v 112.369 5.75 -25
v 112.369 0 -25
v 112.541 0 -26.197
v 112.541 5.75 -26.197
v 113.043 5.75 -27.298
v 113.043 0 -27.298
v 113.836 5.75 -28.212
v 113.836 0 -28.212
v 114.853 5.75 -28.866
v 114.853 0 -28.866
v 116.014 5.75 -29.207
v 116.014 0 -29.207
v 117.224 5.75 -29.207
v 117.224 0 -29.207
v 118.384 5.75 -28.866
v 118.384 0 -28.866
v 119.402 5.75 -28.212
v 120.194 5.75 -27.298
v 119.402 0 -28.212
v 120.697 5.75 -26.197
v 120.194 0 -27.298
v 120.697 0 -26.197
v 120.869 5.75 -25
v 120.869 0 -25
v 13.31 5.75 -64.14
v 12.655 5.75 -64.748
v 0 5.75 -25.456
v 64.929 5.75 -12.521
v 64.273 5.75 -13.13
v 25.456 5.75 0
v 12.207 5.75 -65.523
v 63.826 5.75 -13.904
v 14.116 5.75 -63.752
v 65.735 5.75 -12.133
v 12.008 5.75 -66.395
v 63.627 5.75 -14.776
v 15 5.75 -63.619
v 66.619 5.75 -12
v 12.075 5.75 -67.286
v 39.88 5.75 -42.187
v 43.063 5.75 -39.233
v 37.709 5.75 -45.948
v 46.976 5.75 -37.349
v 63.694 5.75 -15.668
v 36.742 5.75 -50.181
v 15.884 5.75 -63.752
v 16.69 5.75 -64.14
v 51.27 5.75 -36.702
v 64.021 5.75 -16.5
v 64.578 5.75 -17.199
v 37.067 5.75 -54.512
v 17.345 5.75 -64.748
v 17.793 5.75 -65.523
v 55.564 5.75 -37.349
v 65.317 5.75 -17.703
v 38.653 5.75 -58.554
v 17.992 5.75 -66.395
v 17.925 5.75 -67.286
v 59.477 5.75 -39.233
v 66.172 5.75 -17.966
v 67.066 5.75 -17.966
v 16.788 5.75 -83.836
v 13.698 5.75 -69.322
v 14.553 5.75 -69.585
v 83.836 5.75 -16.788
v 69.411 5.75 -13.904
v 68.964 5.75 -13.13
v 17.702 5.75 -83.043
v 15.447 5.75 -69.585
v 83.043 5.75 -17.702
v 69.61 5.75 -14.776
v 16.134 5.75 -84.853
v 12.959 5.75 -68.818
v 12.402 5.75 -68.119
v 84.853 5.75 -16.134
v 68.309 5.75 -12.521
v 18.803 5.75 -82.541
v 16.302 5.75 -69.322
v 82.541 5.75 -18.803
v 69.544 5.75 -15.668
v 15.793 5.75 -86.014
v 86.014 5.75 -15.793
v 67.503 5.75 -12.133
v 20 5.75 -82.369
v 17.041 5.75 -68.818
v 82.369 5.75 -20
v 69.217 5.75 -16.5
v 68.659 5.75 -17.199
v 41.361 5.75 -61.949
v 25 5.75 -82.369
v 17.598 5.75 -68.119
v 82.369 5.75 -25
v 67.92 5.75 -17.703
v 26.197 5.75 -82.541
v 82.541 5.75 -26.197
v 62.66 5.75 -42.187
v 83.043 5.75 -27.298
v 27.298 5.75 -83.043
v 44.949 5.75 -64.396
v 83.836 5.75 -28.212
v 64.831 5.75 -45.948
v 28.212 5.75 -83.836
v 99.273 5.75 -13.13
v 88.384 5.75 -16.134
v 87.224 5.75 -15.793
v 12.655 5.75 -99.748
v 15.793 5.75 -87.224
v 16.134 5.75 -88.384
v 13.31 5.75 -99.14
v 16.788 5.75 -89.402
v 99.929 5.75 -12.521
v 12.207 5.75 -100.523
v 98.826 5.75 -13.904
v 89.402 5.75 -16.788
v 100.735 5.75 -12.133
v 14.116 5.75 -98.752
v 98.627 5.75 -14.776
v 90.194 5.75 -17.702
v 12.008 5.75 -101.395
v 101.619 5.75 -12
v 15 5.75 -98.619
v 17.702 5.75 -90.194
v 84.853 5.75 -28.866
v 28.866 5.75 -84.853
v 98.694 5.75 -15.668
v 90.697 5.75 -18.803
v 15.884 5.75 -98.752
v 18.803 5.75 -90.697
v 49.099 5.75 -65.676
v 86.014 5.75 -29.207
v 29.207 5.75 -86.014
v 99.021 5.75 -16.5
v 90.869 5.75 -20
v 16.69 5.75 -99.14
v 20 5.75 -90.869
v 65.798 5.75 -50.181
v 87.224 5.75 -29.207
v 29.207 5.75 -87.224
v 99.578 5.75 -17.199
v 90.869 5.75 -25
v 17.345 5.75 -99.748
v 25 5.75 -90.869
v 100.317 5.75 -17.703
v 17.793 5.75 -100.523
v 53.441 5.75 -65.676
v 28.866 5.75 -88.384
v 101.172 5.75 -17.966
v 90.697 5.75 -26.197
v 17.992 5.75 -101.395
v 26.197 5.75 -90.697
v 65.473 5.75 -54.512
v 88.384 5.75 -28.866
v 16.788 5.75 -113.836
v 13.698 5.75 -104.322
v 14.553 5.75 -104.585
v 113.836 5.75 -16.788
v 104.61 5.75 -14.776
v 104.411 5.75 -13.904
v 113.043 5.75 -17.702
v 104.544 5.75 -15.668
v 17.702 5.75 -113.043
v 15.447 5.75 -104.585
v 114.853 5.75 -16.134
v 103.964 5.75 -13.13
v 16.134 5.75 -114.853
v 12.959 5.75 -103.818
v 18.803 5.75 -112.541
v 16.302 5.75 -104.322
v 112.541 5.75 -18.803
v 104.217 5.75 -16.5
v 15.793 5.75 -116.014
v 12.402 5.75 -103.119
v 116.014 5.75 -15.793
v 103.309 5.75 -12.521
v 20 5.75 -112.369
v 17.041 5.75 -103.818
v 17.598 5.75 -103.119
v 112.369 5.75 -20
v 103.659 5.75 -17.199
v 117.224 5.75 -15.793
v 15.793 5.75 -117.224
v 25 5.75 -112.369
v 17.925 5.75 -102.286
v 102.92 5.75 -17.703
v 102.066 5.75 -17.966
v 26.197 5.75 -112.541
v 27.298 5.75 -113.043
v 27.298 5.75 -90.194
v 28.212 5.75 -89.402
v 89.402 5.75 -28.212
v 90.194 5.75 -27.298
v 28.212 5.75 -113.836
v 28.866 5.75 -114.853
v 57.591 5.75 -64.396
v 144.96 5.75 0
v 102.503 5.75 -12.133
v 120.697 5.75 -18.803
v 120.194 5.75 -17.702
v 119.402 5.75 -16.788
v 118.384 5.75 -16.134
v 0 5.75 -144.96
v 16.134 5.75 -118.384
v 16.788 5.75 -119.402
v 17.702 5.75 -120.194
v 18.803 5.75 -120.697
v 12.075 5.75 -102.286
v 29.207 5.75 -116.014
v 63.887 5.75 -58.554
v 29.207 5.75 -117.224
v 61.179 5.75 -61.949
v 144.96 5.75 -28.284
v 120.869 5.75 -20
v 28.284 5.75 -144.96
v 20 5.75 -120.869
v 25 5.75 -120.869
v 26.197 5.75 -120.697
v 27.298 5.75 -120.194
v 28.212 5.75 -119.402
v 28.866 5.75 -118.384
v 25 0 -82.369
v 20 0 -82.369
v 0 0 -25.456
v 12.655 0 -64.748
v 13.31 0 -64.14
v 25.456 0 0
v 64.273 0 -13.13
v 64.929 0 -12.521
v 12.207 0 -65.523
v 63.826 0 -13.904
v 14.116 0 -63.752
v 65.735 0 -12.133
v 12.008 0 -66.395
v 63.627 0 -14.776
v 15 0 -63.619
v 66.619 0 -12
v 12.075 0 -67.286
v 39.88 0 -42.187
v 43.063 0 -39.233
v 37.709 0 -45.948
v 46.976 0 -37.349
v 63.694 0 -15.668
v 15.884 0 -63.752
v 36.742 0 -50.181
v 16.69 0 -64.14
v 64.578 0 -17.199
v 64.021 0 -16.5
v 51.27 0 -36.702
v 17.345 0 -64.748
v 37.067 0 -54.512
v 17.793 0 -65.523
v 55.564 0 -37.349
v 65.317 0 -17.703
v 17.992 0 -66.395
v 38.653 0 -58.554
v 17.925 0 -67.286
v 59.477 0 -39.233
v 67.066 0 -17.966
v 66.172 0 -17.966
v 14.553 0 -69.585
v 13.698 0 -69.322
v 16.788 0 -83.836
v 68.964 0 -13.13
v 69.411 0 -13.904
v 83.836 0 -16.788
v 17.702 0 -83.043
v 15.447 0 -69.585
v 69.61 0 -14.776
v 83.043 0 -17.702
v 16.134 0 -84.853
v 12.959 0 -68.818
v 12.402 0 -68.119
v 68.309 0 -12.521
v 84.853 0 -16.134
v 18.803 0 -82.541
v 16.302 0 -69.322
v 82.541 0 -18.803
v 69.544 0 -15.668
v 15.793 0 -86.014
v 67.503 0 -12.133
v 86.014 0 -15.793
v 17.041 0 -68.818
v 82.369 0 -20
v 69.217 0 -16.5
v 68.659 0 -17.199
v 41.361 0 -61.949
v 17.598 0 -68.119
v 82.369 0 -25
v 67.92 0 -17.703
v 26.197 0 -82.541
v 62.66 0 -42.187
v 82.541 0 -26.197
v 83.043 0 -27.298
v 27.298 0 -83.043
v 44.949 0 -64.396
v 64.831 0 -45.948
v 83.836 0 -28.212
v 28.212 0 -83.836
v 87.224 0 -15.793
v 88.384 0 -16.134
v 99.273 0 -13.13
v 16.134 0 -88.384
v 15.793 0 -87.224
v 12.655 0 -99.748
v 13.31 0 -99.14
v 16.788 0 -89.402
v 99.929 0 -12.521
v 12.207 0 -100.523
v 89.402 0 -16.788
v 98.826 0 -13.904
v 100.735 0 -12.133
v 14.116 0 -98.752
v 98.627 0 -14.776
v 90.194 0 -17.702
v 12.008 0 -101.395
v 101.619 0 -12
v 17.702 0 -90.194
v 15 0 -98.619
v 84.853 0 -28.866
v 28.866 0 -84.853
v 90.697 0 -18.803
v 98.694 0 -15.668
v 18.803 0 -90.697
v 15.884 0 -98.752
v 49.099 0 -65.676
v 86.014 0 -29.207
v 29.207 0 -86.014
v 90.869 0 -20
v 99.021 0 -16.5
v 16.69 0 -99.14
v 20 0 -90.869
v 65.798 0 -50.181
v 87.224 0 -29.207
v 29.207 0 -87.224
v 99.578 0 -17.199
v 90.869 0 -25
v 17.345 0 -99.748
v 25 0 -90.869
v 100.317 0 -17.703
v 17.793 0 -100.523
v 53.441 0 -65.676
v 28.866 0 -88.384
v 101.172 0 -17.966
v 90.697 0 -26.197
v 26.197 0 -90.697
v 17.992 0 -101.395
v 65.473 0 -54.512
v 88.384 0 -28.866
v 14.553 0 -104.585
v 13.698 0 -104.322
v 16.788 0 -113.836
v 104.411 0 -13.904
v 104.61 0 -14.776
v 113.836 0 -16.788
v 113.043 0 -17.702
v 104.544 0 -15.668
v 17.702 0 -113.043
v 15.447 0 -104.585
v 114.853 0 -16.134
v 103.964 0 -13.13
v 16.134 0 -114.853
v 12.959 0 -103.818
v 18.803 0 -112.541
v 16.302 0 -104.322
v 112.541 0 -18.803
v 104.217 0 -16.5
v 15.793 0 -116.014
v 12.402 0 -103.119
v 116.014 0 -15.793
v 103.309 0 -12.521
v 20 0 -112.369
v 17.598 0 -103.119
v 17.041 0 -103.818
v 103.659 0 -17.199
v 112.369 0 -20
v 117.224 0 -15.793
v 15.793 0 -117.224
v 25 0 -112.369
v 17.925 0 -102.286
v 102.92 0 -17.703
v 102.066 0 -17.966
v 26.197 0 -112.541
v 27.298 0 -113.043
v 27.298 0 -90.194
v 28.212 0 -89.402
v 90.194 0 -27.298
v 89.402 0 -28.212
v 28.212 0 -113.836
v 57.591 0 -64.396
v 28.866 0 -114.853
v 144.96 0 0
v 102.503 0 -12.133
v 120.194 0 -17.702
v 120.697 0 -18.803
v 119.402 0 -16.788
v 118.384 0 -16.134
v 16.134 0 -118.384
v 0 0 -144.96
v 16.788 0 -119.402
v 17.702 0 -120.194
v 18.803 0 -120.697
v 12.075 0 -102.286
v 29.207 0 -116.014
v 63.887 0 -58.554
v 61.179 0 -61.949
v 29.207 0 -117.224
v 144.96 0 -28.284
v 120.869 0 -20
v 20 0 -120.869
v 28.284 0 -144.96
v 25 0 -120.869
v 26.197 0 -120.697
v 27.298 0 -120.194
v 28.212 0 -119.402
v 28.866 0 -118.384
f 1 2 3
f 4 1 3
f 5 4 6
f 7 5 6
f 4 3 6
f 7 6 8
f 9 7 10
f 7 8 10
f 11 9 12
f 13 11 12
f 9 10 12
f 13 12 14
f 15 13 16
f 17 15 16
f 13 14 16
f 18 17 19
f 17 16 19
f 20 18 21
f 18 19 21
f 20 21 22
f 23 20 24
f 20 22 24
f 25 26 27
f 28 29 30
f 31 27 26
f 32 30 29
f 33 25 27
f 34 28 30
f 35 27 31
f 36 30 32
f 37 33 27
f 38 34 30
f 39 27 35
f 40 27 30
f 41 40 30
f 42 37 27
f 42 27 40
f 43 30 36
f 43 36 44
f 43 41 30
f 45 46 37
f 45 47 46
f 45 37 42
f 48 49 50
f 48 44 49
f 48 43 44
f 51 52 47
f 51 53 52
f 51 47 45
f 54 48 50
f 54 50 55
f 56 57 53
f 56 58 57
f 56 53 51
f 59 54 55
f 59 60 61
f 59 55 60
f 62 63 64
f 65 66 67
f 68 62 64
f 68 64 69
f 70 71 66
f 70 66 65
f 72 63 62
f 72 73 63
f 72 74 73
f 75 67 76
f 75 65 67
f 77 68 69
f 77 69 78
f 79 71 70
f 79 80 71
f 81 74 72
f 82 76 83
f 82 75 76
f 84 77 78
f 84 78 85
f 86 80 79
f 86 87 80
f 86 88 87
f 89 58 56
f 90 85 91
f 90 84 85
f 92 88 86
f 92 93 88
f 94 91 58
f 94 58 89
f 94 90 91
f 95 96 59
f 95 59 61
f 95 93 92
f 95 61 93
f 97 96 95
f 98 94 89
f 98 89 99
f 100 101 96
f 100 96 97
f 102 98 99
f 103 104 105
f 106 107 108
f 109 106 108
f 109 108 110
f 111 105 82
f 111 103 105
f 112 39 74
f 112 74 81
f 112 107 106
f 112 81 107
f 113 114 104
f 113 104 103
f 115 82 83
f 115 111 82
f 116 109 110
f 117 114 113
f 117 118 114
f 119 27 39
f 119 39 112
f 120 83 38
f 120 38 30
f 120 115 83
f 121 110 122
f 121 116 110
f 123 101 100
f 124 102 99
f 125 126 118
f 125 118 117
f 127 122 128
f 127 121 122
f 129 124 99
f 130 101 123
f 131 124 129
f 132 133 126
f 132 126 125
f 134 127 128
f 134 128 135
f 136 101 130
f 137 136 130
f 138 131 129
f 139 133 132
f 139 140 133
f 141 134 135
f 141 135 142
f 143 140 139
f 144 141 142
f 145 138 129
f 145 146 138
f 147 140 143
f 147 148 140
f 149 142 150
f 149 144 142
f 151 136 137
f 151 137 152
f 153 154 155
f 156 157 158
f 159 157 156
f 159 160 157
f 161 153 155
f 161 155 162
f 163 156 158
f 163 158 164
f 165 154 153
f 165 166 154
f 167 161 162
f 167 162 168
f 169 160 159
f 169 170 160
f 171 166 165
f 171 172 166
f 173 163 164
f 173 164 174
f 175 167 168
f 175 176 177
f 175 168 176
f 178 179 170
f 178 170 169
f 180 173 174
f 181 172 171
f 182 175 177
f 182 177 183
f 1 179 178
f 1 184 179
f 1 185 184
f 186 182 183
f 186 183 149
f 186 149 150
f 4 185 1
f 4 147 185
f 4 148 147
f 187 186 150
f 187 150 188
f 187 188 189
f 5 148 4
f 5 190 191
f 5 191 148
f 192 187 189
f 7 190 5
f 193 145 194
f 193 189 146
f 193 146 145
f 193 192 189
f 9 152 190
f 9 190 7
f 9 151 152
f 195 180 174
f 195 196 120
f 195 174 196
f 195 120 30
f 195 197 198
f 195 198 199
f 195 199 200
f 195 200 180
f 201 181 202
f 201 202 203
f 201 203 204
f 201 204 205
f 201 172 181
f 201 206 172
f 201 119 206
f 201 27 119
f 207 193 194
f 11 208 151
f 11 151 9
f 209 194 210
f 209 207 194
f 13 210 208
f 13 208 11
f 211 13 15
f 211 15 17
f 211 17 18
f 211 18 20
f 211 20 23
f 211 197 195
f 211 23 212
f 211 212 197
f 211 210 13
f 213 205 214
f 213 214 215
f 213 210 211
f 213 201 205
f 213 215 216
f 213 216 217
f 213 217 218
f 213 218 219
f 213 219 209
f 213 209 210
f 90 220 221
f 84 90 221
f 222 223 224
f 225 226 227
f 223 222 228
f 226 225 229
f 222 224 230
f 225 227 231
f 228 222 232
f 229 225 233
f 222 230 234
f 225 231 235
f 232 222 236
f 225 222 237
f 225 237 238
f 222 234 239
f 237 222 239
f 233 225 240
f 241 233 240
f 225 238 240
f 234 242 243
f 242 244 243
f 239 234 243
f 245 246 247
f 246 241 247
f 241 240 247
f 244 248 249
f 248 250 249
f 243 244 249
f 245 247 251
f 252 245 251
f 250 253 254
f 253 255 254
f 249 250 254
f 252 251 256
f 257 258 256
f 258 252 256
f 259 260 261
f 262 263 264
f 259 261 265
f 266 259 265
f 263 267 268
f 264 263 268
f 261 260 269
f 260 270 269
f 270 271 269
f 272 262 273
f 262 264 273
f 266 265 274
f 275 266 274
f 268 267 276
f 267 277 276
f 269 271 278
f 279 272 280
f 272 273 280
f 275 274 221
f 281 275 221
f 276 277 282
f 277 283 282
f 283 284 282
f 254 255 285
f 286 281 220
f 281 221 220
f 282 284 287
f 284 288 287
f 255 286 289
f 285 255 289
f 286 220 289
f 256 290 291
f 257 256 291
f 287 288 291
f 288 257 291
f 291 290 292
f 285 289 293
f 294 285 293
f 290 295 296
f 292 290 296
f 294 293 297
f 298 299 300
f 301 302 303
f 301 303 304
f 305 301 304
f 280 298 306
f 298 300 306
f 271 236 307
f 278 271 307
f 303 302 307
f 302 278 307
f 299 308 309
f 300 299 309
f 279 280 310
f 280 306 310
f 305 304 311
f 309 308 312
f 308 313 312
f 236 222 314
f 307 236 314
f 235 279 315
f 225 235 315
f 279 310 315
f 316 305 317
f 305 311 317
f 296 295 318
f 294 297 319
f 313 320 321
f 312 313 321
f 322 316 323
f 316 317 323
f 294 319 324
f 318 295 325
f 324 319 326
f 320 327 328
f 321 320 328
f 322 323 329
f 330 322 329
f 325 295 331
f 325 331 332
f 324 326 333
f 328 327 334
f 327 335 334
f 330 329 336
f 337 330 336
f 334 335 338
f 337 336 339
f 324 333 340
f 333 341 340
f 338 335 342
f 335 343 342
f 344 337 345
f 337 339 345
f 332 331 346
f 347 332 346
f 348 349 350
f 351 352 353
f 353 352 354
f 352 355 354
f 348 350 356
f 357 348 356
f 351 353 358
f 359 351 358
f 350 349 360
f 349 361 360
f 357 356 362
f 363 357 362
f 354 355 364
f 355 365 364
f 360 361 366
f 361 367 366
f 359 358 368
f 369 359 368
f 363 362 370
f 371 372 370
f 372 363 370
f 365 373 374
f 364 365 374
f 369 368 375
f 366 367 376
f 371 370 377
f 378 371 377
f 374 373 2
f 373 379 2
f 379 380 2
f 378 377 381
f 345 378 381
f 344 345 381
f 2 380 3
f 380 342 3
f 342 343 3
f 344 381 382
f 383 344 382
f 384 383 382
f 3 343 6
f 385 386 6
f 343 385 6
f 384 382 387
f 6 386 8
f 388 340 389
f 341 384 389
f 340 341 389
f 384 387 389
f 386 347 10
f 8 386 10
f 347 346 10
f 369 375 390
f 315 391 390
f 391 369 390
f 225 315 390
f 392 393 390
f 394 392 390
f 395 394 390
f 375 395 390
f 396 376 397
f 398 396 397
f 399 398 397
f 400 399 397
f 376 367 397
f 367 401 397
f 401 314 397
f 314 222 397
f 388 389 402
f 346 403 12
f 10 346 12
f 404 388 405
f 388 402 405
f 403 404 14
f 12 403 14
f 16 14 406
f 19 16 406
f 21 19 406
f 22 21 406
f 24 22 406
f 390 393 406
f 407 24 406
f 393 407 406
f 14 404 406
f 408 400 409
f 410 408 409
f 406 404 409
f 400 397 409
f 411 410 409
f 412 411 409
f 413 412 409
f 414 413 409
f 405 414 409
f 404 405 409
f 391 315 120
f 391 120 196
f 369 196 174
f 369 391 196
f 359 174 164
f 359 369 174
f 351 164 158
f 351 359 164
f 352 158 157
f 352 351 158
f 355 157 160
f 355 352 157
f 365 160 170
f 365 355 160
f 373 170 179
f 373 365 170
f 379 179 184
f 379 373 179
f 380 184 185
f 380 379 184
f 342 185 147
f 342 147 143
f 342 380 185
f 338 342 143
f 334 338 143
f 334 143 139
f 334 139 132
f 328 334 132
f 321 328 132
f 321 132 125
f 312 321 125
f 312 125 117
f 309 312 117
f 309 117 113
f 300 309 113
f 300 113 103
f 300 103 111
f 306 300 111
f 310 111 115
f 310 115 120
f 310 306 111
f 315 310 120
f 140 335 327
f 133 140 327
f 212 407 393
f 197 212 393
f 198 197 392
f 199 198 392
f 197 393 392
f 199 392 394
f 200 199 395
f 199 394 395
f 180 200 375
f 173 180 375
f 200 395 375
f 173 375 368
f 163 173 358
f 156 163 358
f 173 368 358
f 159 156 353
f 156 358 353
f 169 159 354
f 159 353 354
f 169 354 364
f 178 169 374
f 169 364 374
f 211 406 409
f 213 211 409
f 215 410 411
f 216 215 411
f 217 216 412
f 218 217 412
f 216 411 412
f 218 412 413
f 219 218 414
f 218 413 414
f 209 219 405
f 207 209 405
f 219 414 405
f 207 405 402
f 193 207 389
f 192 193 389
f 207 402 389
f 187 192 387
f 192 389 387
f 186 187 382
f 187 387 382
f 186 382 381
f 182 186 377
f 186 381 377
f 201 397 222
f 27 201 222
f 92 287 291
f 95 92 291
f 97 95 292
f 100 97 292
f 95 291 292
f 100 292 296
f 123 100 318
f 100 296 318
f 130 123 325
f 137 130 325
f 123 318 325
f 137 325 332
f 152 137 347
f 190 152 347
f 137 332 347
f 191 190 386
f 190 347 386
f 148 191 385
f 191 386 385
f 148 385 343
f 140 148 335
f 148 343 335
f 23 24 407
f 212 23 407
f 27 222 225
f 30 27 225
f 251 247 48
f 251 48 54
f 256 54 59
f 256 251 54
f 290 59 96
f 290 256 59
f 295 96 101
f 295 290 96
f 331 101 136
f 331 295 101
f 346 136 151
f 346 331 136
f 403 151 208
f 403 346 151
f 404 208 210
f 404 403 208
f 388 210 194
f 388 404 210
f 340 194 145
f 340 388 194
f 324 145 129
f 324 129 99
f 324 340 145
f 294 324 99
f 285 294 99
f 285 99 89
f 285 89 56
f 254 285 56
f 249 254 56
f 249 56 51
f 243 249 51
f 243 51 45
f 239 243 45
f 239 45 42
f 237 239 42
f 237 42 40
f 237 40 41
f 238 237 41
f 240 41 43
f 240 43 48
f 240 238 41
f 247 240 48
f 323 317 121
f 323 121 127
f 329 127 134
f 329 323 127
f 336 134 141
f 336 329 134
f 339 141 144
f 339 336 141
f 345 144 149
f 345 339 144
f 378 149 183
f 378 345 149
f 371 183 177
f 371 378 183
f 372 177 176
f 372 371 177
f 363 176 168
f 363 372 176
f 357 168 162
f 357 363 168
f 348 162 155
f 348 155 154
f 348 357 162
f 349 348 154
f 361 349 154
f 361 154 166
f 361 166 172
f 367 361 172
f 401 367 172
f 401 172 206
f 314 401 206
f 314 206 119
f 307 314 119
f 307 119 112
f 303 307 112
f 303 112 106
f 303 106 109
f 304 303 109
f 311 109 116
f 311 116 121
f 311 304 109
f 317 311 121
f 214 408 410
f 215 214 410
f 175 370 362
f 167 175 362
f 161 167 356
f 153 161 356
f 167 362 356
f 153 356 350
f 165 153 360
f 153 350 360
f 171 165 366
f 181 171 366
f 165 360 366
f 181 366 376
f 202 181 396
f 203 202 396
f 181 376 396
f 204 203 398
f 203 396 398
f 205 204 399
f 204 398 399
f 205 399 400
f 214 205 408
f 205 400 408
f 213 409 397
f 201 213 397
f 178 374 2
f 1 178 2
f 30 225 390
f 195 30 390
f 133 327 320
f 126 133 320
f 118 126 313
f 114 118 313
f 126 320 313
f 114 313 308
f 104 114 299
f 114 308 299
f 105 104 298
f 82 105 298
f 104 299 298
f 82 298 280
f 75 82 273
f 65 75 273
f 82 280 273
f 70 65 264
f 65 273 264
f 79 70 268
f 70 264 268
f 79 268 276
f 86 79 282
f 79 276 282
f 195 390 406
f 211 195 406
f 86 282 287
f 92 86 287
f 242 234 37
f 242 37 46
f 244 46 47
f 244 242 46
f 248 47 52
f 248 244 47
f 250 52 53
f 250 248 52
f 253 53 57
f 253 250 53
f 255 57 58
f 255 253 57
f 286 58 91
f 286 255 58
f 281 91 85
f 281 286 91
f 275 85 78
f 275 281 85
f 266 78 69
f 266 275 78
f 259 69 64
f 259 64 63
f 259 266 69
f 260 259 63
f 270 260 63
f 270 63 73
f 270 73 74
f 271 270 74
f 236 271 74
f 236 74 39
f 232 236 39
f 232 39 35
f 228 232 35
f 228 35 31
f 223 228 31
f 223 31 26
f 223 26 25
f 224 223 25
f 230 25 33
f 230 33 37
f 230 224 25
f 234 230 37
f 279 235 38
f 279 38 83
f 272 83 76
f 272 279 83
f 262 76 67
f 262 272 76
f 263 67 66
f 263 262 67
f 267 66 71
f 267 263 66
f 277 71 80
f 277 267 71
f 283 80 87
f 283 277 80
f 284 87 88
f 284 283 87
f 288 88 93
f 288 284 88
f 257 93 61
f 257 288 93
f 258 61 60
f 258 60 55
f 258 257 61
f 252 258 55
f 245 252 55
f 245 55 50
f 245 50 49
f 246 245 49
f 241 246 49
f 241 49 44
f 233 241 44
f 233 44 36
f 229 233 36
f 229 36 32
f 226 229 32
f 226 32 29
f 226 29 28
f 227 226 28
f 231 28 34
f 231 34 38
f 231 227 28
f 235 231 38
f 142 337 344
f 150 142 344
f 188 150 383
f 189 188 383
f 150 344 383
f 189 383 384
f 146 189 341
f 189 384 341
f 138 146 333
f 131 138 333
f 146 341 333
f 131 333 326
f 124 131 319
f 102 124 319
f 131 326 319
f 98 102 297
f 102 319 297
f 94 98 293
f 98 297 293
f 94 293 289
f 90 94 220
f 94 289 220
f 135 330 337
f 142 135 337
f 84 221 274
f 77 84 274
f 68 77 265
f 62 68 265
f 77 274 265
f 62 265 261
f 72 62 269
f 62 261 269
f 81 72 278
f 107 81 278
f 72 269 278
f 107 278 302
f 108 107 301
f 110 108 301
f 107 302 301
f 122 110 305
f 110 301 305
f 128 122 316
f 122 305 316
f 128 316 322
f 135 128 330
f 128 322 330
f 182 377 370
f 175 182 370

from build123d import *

# Parameters (mm, degrees)
SKETCH_1_R      = 3
SKETCH_1_R_2    = 14.568467703
EXTRUDE_1_DEPTH = 5.75


with BuildPart() as part:
    # 草图1 → 凸台-拉伸1 (new body)
    with BuildSketch(Plane(origin=(0, 0, 0), x_dir=(1, 0, 0), z_dir=(0, 1, 0))):
        Polygon((0, 144.96), (0, 25.455844123), (25.455844123, 0), (144.96, 0), (144.96, 28.284271247), (28.284271247, 144.96), align=None)
        with Locations(Location((66.618795027, 15, 0), (0, 0, 270))):
            Circle(SKETCH_1_R, mode=Mode.SUBTRACT)
        with Locations(Location((15, 66.618795027, 0), (0, 0, 270))):
            Circle(SKETCH_1_R, mode=Mode.SUBTRACT)
        with Locations(Location((51.27, 51.27, 0), (0, 0, 270))):
            Circle(SKETCH_1_R_2, mode=Mode.SUBTRACT)
        with Locations(Location((101.618795027, 15, 0), (0, 0, 270))):
            Circle(SKETCH_1_R, mode=Mode.SUBTRACT)
        with BuildLine():
            ThreePointArc((90.868795027, 20), (86.618795027, 15.75), (82.368795027, 20))
            Line((82.368795027, 20), (82.368795027, 25))
            ThreePointArc((82.368795027, 25), (86.618795027, 29.25), (90.868795027, 25))
            Line((90.868795027, 25), (90.868795027, 20))
        make_face(mode=Mode.SUBTRACT)
        with BuildLine():
            ThreePointArc((120.868795027, 20), (116.618795027, 15.75), (112.368795027, 20))
            Line((112.368795027, 20), (112.368795027, 25))
            ThreePointArc((112.368795027, 25), (116.618795027, 29.25), (120.868795027, 25))
            Line((120.868795027, 25), (120.868795027, 20))
        make_face(mode=Mode.SUBTRACT)
        with BuildLine():
            Line((25, 82.368795027), (20, 82.368795027))
            ThreePointArc((20, 82.368795027), (15.75, 86.618795027), (20, 90.868795027))
            Line((20, 90.868795027), (25, 90.868795027))
            ThreePointArc((25, 90.868795027), (29.25, 86.618795027), (25, 82.368795027))
        make_face(mode=Mode.SUBTRACT)
        with Locations(Location((15, 101.618795027, 0), (0, 0, 270))):
            Circle(SKETCH_1_R, mode=Mode.SUBTRACT)
        with BuildLine():
            Line((25, 112.368795027), (20, 112.368795027))
            ThreePointArc((20, 112.368795027), (15.75, 116.618795027), (20, 120.868795027))
            Line((20, 120.868795027), (25, 120.868795027))
            ThreePointArc((25, 120.868795027), (29.25, 116.618795027), (25, 112.368795027))
        make_face(mode=Mode.SUBTRACT)
    extrude(amount=EXTRUDE_1_DEPTH)


solid = part.part
